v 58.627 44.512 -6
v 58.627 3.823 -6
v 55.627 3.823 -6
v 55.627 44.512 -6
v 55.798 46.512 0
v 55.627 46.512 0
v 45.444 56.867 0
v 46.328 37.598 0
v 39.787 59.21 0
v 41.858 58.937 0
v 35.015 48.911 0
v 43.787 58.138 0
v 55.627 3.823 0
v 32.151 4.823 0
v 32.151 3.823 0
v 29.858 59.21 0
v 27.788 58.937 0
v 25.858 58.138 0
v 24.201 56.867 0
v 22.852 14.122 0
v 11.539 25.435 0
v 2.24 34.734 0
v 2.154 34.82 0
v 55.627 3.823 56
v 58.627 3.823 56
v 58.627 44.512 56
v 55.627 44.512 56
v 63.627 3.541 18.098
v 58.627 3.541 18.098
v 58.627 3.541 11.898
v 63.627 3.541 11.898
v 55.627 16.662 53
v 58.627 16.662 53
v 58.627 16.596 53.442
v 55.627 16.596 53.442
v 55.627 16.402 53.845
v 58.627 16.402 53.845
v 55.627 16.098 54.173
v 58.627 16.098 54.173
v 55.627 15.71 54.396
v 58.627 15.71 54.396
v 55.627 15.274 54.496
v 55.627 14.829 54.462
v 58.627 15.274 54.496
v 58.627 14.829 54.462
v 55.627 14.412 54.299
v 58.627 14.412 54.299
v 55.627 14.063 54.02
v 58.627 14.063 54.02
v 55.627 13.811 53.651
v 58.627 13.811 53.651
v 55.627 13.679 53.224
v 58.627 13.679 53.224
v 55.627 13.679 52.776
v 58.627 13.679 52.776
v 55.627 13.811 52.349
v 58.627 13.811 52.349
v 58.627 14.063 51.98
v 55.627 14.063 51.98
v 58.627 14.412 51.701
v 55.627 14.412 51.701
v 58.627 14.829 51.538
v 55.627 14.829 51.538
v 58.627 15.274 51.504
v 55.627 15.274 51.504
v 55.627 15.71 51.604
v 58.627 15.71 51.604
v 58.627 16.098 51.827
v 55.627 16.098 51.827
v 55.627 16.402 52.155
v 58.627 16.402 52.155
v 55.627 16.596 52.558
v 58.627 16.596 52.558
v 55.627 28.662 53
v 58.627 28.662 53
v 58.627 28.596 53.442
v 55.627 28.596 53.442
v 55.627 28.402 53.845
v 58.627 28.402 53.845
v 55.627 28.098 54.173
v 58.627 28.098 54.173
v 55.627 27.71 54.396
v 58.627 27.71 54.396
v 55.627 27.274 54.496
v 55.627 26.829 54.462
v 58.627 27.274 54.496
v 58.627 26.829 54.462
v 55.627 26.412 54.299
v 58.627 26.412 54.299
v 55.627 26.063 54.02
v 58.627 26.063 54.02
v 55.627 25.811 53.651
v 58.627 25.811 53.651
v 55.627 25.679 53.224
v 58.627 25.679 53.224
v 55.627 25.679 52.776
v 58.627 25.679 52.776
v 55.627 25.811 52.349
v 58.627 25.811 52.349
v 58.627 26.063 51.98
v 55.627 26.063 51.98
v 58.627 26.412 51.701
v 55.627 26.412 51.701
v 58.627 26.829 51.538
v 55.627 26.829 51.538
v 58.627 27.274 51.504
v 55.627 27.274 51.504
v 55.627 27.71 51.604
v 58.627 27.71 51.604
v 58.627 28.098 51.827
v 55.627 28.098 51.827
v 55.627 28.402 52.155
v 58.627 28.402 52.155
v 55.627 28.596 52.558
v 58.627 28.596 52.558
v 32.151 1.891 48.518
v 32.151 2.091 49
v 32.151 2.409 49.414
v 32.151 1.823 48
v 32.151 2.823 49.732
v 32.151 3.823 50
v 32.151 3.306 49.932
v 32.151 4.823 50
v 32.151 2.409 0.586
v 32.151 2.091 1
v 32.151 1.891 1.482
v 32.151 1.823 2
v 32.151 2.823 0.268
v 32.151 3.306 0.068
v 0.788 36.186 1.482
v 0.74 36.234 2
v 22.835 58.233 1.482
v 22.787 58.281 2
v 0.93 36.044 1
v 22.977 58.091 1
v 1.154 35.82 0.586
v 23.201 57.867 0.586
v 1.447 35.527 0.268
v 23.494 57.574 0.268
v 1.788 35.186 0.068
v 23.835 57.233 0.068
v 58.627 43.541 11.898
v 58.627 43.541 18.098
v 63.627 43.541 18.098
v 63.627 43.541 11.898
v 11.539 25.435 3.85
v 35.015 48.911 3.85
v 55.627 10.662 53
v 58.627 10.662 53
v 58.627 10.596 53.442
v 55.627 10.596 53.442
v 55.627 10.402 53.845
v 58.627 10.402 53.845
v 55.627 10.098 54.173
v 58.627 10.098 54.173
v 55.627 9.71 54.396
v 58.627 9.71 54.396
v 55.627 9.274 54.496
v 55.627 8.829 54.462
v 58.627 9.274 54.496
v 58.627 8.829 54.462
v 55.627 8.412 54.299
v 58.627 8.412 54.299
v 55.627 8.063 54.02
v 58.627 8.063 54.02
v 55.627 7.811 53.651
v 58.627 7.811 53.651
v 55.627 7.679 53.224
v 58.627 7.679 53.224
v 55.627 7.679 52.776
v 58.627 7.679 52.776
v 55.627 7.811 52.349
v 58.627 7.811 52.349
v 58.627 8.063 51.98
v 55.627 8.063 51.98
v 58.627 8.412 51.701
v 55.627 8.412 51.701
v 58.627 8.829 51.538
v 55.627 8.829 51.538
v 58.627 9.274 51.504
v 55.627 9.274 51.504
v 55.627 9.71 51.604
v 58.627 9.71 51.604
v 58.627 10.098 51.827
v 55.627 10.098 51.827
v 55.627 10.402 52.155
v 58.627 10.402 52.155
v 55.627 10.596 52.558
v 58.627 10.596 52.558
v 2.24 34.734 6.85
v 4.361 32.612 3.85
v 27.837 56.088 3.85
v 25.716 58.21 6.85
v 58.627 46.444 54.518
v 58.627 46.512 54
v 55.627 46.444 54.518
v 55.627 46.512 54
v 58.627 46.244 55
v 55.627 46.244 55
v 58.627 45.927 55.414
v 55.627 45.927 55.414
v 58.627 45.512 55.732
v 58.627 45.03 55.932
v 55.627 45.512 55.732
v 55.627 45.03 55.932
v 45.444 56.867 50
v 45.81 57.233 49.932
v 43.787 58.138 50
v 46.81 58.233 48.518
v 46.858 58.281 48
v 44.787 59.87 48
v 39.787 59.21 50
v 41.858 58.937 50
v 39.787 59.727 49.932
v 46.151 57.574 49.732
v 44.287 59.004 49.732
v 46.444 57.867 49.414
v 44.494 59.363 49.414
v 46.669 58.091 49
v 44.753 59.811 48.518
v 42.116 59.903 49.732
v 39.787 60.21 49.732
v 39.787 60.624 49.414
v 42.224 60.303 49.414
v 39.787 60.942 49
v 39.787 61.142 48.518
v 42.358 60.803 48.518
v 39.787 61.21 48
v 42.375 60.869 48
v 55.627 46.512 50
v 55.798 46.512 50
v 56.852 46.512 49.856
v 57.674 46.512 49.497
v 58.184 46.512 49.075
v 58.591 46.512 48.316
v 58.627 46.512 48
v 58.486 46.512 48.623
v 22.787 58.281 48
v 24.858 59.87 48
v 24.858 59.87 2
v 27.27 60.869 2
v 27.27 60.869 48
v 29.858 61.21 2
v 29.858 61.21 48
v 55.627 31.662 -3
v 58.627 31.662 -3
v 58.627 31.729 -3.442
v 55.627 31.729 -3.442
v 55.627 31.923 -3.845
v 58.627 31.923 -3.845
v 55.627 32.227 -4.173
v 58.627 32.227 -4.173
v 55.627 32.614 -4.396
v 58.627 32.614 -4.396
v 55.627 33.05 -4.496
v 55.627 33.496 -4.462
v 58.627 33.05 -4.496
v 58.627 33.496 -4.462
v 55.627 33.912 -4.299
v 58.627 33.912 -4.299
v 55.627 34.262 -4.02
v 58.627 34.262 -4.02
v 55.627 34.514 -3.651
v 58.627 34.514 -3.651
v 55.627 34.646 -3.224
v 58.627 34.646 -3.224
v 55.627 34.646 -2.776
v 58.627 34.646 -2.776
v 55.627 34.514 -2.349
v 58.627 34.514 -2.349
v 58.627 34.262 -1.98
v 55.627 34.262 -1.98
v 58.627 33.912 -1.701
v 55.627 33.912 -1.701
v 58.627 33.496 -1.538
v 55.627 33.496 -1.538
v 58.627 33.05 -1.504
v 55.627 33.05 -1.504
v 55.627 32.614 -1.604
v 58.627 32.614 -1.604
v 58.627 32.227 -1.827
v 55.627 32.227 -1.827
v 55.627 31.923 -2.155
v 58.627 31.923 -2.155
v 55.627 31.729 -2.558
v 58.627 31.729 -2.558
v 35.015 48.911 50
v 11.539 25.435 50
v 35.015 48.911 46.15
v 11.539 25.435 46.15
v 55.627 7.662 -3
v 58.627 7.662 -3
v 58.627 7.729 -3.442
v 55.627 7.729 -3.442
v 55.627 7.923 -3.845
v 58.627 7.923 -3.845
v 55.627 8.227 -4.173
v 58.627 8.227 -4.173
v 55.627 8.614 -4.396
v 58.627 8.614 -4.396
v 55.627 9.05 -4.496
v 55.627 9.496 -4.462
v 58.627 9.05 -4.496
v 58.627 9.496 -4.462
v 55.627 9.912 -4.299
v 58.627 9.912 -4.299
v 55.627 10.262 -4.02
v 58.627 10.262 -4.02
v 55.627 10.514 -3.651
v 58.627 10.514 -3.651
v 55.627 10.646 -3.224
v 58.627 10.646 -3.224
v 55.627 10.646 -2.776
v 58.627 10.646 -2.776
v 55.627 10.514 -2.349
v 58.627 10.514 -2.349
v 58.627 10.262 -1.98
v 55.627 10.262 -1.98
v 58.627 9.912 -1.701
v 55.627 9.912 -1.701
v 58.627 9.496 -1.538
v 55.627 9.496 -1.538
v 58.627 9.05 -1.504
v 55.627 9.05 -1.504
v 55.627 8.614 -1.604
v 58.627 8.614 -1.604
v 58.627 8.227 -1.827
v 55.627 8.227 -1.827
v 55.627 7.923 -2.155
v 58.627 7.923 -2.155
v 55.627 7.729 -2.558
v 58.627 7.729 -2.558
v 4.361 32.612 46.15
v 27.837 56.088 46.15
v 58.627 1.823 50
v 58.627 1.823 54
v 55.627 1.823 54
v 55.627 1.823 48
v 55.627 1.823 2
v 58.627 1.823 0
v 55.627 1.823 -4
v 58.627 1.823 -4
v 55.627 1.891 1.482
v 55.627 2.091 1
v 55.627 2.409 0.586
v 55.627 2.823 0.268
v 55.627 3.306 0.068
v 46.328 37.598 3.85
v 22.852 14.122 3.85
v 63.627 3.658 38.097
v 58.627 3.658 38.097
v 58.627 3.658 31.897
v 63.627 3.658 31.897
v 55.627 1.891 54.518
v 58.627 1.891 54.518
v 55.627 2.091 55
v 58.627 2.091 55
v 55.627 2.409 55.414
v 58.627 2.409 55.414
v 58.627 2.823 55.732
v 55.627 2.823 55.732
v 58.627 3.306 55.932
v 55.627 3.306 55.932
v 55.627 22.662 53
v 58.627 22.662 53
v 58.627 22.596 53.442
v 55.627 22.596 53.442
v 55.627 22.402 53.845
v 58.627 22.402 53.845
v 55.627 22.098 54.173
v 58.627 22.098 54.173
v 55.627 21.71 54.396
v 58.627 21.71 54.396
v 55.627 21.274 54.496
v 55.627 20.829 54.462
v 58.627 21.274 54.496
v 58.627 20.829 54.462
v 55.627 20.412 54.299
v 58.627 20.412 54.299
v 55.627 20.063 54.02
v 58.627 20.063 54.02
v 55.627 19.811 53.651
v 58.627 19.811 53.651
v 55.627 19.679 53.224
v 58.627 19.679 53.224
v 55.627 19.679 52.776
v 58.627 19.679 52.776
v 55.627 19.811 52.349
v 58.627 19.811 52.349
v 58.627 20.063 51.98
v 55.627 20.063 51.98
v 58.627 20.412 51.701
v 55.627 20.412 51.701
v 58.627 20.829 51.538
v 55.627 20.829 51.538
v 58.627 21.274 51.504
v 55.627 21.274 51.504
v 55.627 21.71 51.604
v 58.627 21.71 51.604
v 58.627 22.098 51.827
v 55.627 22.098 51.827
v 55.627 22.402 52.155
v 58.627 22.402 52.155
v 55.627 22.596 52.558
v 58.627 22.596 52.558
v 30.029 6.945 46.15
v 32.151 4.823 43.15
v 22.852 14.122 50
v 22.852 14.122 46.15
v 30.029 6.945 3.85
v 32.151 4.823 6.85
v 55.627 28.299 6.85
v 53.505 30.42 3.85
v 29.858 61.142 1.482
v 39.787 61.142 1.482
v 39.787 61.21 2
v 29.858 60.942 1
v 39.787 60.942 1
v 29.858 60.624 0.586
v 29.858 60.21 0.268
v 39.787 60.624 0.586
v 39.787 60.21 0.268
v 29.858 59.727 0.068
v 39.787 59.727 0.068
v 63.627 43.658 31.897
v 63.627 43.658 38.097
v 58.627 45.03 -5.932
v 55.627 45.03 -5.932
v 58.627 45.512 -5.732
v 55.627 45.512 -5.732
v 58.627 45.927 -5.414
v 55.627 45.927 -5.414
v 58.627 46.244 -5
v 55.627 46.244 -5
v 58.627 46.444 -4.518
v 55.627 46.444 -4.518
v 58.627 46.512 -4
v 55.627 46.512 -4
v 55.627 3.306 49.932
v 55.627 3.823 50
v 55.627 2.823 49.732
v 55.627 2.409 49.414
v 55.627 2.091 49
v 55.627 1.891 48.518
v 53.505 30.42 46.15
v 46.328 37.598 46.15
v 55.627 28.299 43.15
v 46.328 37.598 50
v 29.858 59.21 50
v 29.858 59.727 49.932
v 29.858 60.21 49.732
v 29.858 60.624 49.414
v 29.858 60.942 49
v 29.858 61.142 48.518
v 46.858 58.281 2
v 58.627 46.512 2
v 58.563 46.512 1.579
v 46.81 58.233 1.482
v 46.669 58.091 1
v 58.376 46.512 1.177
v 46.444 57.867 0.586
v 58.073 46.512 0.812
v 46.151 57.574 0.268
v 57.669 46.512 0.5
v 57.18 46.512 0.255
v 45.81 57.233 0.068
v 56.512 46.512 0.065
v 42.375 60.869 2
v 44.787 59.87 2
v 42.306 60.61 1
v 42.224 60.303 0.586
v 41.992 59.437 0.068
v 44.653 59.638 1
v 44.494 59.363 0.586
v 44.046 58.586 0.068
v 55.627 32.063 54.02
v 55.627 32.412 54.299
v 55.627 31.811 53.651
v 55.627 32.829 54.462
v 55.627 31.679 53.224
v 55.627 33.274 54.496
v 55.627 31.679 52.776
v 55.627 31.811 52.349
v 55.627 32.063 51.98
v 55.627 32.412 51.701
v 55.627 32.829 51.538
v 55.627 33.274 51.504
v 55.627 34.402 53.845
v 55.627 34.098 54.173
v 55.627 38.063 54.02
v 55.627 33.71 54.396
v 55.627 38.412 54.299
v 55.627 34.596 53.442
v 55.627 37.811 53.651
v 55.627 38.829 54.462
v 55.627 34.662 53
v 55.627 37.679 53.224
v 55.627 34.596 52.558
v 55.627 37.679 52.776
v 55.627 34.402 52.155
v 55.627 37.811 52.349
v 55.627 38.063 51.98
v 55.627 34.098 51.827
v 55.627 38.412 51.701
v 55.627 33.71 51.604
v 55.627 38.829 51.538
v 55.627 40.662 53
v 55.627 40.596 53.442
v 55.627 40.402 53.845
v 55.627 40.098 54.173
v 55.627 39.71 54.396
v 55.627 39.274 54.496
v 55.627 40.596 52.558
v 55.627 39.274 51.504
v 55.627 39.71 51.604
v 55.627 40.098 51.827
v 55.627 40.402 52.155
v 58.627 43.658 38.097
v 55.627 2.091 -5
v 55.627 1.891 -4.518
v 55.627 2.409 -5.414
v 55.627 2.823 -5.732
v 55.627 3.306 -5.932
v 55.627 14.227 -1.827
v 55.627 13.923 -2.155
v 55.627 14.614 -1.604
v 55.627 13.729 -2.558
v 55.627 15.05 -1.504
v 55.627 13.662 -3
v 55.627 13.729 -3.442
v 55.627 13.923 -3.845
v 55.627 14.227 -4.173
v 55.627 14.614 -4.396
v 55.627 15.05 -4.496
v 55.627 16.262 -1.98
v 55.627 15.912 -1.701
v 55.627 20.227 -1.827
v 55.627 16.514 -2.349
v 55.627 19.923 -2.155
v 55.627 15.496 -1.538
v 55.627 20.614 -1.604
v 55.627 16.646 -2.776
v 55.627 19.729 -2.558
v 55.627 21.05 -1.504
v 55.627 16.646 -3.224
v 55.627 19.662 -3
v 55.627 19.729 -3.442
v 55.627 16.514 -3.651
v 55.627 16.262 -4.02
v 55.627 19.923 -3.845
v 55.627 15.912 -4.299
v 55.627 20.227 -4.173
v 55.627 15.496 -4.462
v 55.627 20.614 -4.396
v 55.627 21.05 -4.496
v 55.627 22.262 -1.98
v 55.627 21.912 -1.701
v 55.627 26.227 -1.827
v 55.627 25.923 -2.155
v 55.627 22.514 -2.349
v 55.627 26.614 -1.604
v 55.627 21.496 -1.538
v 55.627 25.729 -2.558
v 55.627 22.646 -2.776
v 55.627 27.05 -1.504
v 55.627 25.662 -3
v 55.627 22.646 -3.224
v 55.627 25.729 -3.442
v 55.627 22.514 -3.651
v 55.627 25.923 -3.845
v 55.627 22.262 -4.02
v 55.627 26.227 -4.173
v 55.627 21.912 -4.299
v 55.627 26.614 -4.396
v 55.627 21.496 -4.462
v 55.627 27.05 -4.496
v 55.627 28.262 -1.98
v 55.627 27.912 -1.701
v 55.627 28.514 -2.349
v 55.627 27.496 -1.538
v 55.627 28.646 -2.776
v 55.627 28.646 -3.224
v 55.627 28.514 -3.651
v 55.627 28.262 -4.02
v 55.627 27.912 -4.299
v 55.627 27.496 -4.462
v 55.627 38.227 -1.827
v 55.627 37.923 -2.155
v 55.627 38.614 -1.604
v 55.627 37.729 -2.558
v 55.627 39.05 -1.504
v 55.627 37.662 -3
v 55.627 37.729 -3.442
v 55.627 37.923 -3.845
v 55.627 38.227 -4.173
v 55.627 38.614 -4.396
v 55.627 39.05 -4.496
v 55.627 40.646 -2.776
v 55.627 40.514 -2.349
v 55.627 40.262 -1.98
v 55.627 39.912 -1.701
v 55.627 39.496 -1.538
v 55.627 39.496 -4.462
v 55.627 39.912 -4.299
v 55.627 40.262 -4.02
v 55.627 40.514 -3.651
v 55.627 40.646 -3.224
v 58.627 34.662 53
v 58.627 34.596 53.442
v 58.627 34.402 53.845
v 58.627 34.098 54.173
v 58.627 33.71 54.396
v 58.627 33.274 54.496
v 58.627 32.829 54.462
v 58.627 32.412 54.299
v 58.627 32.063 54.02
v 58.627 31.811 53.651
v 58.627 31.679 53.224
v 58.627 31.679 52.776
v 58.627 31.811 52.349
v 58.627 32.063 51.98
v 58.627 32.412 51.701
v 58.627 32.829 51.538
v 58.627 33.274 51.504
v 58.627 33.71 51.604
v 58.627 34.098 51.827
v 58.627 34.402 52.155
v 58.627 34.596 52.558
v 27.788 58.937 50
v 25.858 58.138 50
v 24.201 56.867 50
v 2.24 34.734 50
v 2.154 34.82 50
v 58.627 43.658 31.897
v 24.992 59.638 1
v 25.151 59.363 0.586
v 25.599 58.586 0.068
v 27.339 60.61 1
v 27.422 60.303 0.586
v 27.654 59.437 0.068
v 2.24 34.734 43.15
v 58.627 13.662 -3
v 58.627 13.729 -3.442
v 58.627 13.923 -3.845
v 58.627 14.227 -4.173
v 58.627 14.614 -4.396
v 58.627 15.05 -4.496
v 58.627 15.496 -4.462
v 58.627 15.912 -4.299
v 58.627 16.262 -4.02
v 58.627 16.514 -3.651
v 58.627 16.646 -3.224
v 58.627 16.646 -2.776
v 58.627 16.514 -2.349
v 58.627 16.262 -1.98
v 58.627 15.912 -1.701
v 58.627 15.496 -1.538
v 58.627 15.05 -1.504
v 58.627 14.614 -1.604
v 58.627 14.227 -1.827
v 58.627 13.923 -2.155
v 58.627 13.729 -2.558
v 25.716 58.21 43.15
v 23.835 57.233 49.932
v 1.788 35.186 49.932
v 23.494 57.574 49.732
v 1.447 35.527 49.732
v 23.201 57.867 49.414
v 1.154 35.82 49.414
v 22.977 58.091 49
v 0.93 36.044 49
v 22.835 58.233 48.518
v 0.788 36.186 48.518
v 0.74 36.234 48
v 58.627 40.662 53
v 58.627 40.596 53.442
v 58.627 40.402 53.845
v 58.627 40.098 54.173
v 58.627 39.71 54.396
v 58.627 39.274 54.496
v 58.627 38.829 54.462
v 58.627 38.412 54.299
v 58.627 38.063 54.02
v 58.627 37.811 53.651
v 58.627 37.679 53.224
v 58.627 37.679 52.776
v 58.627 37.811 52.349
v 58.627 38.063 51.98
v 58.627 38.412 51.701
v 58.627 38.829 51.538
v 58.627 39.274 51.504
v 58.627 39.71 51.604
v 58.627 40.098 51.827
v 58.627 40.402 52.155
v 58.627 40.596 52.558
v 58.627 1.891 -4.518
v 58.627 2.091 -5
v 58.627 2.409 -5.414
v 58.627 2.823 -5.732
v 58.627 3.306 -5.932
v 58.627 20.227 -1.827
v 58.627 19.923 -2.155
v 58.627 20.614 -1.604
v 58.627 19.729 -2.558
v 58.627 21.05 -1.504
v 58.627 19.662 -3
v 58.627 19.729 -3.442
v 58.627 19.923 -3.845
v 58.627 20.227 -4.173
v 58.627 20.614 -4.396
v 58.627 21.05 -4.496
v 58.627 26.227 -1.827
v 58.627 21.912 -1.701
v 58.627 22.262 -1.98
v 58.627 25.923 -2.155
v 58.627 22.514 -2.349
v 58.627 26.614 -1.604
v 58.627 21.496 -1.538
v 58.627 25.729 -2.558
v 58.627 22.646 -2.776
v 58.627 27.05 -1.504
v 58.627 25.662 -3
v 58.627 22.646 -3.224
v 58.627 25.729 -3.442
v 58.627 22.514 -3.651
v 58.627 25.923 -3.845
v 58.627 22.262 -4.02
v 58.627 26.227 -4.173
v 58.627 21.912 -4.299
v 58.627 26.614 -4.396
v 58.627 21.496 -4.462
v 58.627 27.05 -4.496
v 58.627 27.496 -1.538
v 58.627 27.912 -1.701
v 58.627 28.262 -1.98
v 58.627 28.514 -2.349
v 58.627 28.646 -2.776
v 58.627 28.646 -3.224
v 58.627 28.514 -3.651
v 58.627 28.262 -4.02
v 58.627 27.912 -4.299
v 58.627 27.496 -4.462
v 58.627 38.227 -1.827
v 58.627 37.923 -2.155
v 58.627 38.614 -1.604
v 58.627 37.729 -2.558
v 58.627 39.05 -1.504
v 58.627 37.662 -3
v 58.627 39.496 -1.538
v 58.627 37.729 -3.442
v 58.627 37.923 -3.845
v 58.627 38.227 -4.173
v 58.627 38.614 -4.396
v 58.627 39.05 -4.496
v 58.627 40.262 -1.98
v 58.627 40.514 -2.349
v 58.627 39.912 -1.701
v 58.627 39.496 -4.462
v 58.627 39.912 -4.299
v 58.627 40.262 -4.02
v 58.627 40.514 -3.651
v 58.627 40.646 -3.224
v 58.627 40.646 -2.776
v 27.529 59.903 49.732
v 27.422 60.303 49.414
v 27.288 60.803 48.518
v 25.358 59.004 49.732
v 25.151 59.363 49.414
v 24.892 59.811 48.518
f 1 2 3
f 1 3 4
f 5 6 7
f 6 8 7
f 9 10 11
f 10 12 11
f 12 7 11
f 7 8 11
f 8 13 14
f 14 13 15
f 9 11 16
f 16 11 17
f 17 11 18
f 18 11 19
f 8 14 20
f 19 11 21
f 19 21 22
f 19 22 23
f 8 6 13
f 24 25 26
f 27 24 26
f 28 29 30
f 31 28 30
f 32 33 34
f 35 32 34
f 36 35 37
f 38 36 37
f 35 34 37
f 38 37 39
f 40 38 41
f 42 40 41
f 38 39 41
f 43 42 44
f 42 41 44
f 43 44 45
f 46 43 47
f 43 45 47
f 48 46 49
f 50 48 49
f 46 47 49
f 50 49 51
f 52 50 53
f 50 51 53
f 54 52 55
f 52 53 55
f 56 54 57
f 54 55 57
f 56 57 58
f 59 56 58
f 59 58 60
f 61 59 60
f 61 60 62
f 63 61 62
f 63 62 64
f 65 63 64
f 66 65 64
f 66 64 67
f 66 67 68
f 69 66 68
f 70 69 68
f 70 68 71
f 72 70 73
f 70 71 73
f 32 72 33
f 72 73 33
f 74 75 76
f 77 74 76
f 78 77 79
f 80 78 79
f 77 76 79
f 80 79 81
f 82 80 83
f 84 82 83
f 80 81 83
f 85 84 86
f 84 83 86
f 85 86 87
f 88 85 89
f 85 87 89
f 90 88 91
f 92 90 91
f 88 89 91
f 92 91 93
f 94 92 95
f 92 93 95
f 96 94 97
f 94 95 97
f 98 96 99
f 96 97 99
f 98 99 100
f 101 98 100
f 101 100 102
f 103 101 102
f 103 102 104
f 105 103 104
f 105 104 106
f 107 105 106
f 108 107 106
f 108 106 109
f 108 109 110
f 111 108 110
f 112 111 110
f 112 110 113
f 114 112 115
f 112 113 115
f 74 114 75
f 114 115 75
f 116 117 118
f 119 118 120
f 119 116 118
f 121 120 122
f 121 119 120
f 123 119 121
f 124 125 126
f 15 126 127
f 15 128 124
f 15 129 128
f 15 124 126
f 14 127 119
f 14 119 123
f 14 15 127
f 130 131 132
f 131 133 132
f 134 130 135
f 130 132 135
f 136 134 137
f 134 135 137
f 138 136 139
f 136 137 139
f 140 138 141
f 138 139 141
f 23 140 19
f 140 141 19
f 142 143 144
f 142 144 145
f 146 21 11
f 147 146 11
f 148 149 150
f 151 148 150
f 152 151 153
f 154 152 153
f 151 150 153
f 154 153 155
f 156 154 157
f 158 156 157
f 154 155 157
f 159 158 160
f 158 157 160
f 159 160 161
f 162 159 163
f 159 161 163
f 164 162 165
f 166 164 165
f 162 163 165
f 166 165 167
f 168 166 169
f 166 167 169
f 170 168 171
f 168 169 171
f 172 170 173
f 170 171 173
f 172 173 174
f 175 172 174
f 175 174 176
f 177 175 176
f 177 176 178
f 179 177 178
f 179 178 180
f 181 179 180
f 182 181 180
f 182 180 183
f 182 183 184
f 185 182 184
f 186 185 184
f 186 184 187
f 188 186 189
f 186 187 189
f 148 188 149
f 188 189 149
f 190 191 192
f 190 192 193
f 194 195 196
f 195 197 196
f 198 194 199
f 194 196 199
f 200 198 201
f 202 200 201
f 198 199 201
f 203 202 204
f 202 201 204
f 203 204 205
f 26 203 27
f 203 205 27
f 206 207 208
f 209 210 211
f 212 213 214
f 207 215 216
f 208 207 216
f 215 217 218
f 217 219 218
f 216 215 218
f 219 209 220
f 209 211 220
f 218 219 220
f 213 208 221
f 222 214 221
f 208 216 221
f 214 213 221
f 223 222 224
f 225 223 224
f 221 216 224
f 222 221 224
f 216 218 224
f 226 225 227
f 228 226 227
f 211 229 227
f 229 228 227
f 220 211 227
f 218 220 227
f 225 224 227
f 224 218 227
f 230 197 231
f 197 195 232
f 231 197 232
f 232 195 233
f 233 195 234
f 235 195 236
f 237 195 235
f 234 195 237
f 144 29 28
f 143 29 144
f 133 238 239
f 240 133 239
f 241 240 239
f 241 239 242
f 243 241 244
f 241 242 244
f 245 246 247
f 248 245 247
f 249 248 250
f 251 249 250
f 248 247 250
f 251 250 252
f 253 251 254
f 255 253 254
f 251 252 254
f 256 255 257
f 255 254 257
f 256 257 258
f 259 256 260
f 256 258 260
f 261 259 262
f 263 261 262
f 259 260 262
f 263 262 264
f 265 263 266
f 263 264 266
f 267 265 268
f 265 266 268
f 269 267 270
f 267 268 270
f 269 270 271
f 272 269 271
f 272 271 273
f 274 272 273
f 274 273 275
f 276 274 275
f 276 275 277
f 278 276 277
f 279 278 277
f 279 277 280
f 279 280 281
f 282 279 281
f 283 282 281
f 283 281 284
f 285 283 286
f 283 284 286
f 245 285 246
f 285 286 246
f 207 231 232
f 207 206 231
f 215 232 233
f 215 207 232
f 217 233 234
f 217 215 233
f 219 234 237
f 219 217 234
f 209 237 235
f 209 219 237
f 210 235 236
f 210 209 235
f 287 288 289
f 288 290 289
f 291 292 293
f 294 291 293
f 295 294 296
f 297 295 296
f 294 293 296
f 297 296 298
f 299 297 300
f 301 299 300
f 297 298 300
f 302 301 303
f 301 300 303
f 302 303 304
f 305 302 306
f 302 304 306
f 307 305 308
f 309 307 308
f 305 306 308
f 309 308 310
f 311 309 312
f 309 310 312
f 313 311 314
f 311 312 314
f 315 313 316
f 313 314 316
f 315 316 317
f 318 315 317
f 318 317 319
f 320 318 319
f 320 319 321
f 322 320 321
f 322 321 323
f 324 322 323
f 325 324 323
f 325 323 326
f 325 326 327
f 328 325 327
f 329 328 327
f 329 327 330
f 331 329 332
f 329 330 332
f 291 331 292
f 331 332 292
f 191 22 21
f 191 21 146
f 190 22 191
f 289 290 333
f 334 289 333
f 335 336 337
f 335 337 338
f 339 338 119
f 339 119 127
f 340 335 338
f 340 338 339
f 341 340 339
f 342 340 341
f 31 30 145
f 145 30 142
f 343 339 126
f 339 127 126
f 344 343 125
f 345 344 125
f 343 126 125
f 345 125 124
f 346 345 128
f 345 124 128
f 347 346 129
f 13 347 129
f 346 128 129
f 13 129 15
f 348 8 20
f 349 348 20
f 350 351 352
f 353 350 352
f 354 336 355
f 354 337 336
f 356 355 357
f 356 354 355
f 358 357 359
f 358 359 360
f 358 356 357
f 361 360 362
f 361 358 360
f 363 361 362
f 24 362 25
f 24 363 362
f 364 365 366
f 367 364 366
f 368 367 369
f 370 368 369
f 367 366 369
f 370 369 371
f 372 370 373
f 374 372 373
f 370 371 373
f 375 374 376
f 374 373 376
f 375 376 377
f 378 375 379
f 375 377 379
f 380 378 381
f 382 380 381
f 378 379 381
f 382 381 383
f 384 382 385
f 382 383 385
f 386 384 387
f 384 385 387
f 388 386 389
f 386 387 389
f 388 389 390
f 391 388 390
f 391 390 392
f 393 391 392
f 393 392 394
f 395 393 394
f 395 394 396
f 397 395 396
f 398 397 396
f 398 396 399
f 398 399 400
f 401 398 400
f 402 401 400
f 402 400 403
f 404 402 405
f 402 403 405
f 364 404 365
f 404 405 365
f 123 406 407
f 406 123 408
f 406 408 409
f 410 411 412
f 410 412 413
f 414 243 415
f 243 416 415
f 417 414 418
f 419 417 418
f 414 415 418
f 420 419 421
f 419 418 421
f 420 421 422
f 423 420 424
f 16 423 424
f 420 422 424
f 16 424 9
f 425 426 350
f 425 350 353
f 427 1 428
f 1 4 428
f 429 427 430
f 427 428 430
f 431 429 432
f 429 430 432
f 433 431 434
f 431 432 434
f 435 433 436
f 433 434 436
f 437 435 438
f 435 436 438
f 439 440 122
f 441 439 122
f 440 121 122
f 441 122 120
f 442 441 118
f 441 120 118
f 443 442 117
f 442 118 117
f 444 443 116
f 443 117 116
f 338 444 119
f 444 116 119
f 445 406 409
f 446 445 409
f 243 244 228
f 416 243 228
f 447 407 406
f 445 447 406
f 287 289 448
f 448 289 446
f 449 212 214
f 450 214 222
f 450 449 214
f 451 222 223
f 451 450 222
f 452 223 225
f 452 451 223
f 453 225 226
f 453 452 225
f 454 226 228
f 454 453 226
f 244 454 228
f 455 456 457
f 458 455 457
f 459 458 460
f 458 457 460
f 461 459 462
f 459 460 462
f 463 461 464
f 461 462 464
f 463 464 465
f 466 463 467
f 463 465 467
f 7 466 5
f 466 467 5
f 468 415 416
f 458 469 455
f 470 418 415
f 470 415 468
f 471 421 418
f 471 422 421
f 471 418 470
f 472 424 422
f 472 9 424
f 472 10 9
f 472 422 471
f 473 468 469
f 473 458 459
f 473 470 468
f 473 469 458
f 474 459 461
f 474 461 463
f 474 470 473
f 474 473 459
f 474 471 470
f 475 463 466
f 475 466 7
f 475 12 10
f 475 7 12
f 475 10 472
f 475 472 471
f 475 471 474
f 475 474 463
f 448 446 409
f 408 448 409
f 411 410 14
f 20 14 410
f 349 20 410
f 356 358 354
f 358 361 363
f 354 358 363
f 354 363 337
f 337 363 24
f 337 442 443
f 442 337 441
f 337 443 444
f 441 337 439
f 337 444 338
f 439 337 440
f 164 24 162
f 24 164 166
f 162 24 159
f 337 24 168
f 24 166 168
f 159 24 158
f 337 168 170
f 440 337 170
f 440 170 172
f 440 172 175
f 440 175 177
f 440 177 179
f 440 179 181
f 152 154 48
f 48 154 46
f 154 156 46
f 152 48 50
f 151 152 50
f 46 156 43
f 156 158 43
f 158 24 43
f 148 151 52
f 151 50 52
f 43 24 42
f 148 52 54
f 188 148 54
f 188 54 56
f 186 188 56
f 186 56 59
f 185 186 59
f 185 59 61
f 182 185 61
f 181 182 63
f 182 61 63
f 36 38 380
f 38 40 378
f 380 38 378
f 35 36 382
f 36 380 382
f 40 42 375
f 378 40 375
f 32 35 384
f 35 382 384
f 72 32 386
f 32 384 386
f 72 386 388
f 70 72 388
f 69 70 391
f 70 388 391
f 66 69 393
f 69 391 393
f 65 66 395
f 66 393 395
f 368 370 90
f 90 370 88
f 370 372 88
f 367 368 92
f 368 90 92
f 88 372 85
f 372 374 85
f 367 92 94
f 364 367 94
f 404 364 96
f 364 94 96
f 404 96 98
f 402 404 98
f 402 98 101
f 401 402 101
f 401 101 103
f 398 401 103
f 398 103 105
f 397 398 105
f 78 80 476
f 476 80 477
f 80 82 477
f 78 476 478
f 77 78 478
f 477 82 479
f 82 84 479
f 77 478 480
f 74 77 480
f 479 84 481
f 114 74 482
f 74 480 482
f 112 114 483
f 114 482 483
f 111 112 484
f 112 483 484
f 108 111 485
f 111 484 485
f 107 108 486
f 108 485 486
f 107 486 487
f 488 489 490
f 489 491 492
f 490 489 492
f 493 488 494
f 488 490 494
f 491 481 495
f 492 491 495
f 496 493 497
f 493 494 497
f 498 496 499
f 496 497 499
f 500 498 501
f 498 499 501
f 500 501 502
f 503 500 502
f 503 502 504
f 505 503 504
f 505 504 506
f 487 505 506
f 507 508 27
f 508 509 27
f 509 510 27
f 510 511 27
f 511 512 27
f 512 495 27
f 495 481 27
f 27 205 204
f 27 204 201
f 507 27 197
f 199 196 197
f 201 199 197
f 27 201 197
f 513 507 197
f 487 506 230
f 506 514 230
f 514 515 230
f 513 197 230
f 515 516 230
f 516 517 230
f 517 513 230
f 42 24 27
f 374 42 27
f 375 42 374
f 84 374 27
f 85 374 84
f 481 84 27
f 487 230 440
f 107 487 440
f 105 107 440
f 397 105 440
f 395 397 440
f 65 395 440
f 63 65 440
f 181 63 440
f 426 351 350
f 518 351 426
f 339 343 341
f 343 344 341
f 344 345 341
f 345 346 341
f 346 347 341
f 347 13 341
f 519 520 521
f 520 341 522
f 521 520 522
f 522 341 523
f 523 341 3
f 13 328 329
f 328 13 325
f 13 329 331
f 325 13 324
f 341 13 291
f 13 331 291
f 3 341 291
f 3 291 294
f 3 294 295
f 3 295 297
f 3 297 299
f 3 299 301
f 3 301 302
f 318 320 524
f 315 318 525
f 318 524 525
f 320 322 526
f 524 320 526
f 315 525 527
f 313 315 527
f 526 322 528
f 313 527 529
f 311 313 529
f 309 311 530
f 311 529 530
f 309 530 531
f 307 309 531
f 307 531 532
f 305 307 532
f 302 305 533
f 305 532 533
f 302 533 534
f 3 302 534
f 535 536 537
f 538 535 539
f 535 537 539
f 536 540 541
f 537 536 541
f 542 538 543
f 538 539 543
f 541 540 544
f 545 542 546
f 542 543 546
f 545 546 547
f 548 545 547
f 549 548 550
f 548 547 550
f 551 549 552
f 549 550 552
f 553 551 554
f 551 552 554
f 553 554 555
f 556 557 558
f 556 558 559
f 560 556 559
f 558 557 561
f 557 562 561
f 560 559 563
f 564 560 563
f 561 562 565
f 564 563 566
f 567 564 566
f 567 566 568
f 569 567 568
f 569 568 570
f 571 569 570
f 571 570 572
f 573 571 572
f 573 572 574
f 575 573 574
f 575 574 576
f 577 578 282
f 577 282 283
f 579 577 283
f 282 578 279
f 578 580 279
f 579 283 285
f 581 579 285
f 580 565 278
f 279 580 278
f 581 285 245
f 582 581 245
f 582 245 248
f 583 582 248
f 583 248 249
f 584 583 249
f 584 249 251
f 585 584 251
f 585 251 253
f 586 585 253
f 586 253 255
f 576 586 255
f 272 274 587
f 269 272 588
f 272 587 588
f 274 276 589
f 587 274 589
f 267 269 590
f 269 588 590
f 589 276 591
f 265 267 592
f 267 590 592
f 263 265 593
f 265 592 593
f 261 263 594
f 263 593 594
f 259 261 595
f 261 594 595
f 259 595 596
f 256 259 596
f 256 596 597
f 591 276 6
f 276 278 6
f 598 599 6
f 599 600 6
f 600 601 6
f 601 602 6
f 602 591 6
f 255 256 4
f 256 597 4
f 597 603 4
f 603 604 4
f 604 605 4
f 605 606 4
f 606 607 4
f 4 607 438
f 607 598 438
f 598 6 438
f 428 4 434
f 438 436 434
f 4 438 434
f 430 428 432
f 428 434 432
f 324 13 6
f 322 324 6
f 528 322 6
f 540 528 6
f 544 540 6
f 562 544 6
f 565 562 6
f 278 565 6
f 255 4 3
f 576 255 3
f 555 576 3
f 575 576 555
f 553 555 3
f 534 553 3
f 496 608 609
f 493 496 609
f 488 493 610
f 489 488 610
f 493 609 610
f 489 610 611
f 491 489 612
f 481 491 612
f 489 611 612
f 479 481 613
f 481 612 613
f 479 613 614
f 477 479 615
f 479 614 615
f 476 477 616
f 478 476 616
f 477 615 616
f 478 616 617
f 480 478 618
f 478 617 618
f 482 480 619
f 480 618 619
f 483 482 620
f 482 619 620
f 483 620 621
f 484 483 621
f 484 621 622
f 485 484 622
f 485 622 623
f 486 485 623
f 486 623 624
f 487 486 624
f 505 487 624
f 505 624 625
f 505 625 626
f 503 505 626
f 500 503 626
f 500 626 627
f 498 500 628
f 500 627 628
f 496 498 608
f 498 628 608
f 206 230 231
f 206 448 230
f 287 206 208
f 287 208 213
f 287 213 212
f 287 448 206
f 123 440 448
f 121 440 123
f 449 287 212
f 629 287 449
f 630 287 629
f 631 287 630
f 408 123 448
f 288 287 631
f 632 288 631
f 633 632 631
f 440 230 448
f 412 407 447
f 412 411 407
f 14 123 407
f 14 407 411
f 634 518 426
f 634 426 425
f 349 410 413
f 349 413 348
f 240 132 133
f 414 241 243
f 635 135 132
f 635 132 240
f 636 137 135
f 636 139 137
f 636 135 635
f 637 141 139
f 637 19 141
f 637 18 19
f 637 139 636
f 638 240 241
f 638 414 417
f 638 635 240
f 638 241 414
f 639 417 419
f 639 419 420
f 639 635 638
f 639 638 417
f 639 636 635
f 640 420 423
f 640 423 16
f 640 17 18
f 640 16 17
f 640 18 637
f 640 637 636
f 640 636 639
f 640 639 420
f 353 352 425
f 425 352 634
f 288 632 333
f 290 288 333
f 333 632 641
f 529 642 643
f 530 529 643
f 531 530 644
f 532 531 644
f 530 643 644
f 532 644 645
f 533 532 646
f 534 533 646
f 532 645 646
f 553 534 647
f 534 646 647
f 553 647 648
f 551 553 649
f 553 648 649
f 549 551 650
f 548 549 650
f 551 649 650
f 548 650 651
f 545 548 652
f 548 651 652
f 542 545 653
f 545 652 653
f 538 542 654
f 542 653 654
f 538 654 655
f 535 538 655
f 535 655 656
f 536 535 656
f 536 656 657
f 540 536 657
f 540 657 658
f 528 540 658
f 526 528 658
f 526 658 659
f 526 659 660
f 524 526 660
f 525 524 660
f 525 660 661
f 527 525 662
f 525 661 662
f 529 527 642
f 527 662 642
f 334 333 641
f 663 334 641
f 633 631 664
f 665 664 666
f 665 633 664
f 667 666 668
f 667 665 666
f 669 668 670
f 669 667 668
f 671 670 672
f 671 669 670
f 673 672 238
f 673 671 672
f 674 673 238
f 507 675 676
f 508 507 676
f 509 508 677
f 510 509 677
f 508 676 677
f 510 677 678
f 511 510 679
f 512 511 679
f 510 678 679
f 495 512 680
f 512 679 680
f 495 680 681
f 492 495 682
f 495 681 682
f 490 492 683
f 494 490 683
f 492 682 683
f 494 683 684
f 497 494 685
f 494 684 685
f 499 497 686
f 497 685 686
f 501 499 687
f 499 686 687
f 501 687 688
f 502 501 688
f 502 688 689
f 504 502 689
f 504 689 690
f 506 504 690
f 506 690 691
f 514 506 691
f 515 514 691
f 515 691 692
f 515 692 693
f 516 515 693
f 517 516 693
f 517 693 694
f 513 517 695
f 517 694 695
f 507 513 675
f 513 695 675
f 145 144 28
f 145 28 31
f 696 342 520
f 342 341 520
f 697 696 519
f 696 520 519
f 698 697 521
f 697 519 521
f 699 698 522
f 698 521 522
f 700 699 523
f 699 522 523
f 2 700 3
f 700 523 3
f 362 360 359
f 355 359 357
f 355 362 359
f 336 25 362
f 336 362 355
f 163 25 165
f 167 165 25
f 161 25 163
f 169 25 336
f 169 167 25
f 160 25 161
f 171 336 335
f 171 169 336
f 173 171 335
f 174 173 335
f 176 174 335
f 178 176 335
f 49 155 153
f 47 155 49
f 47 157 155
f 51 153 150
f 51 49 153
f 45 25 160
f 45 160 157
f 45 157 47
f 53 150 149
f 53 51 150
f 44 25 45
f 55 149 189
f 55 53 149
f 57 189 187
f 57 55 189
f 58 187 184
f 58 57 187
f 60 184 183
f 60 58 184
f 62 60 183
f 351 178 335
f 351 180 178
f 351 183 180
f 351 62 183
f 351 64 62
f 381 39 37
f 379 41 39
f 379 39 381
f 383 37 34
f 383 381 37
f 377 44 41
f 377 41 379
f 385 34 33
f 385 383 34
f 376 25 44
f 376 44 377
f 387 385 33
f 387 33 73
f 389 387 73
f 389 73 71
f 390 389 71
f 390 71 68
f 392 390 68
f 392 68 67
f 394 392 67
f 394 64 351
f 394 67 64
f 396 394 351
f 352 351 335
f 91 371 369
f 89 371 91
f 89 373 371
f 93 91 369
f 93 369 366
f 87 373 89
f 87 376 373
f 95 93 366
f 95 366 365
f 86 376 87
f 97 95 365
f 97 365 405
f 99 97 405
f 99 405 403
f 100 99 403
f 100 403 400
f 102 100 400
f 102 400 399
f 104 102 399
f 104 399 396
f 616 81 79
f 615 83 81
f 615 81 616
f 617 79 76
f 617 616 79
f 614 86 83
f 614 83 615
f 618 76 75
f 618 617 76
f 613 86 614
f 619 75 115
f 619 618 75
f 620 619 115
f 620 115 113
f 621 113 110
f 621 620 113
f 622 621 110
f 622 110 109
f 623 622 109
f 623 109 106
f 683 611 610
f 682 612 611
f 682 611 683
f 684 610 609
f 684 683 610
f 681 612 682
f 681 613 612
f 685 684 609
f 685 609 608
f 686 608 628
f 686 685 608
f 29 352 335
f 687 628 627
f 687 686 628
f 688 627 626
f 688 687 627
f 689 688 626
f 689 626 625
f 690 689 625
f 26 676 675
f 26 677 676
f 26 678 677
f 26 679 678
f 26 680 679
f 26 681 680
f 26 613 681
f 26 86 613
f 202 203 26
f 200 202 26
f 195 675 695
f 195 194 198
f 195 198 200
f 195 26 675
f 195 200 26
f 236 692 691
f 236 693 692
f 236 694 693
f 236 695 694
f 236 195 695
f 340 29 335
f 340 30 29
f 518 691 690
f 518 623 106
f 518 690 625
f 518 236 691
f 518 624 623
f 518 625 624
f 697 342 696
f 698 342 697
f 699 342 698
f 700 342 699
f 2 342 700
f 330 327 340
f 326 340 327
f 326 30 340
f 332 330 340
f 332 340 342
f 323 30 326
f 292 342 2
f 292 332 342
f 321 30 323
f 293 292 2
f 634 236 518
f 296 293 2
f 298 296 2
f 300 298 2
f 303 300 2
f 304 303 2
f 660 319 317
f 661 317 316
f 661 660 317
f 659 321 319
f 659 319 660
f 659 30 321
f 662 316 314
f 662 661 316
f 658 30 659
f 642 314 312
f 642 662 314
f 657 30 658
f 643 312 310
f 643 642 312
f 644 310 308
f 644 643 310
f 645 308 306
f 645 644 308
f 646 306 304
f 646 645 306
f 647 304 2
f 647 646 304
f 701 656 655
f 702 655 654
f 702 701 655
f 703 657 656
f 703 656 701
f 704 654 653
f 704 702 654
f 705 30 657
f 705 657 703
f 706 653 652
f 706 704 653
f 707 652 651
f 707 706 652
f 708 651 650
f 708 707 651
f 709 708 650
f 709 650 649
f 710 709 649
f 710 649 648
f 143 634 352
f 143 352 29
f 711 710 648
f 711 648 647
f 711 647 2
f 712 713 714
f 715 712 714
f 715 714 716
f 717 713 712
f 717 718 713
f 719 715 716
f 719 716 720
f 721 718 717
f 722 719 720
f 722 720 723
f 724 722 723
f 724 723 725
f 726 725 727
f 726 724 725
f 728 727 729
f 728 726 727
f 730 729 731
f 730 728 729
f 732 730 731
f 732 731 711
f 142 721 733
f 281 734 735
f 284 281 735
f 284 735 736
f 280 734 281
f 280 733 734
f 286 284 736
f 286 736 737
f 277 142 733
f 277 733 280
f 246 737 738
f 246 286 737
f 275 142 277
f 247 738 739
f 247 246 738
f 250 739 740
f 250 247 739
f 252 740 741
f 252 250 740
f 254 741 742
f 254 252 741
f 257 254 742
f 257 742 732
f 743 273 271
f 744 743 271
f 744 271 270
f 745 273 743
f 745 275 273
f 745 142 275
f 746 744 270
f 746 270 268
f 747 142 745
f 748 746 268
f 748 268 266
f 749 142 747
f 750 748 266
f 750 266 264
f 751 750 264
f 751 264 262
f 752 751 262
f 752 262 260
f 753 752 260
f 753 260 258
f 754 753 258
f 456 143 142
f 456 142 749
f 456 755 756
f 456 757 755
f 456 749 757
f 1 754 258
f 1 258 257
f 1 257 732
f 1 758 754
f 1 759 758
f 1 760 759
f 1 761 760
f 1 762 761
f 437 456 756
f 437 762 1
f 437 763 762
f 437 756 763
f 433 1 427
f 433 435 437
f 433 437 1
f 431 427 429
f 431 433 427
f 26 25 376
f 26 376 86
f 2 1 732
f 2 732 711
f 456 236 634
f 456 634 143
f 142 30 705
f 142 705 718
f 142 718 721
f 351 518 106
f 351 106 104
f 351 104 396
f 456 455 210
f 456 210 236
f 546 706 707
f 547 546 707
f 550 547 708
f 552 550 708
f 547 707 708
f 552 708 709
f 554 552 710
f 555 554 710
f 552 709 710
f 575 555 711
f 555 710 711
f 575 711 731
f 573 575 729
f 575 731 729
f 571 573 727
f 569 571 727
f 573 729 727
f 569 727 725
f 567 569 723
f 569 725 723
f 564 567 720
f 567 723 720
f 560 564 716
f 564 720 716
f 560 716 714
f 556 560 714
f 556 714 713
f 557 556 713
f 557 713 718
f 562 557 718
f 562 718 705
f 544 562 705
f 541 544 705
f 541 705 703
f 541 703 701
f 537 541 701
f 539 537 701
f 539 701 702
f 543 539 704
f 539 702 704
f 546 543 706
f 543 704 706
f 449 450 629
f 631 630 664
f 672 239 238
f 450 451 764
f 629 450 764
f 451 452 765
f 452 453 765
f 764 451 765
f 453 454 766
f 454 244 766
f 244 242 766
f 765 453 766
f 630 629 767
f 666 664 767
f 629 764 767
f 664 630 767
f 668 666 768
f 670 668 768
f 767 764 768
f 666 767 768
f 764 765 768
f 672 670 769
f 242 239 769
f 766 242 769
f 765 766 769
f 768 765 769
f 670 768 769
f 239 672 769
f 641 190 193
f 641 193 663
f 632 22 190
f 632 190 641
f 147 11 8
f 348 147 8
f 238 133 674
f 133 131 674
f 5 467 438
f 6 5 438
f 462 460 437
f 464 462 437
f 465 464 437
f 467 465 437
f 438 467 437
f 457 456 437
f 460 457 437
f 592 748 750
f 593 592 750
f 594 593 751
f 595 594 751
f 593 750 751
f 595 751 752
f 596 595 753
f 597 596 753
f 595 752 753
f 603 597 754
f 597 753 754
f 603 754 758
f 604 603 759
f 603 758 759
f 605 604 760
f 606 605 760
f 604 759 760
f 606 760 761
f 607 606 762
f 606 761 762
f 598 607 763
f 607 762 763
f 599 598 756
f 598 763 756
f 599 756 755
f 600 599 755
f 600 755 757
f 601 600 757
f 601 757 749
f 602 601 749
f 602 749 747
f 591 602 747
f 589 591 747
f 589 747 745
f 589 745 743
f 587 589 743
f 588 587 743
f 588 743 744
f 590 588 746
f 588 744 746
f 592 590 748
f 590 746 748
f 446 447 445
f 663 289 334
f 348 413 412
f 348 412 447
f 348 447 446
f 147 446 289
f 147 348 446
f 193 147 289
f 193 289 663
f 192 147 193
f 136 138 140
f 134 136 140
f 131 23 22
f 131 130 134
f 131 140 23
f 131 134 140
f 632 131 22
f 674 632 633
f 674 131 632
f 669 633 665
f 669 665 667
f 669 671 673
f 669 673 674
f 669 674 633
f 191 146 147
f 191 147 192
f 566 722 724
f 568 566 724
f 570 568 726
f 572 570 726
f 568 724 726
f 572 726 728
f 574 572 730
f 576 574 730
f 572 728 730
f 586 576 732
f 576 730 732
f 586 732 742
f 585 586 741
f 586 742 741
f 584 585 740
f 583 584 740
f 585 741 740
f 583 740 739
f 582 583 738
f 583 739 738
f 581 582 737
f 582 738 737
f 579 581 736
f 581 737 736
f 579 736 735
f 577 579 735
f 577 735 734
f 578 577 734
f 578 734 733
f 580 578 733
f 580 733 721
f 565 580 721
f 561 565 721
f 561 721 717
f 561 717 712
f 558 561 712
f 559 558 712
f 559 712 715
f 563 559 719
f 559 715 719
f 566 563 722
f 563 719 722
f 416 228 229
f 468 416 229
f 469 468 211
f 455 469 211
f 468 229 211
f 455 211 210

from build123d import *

# Parameters (mm, degrees)
EXTRUDE_1_DEPTH     = 50
EXTRUDE_3_DEPTH     = 33.199998
EXTRUDE_4_REACH     = 79.048
SKETCH_4_W          = 50
SKETCH_4_H          = 2.121320344
CUT_EXTRUDE_1_DEPTH = 99.405896905
SKETCH_8_W          = 62
SKETCH_8_H          = 44.689148571
SKETCH_8_R          = 1.5
EXTRUDE_5_DEPTH     = 3
FILLET_1_R          = 10
FILLET_2_R          = 2
SKETCH_9_W          = 6.2
SKETCH_9_H          = 40
EXTRUDE_6_DEPTH     = 5
SKETCH_10_W         = 6.2
SKETCH_10_H         = 40
EXTRUDE_7_DEPTH     = 5


with BuildPart() as part:
    # 草图1 → 凸台-拉伸1 (new body)
    with BuildSketch(Plane.XY):
        Polygon((25.716046069, 61.209761814), (43.929249505, 61.209761814), (58.626662914, 46.512348406), (58.626662914, 1.823199835), (32.150717778, 1.823199835), (32.150717778, 4.823199835), (55.626662914, 28.29914497), (25.716046069, 58.209761814), align=None)
    extrude(amount=EXTRUDE_1_DEPTH)

    # 草图3 → 凸台-拉伸3 (add)
    with BuildSketch(Plane(origin=(41.962903942, 41.962903942, 0), x_dir=(0, 0, 1), z_dir=(-0.7071067811865476, -0.7071067811865476, 0))):
        Polygon((50, -19.323473251), (46.15, -19.323473251), (43.15, -19.323473251), (46.15, -16.323473251), (46.15, 19.976526749), (43.15, 22.976526749), (46.15, 22.976526749), (50, 22.976526749), align=None)
        Polygon((0, 22.976526749), (0, -19.323473251), (3.85, -19.323473251), (6.85, -19.323473251), (3.85, -16.323473251), (3.85, 19.976526749), (6.85, 22.976526749), (3.85, 22.976526749), align=None)
    extrude(amount=EXTRUDE_3_DEPTH)

    # 凸台-拉伸4: up to this plane
    extrude_4_end = Plane(origin=(25.716046069, 61.209761814, 50), z_dir=(0, -1, 0))
    # 草图4 → 凸台-拉伸4 (add, up to the surface)
    with BuildSketch(Plane(origin=(18.486958806, 18.486958806, 0), x_dir=(0, 0, 1), z_dir=(-0.7071067811865477, -0.7071067811865475, 0)), mode=Mode.PRIVATE) as extrude_4_sk1:
        with Locations((25, 24.037186921)):
            Rectangle(SKETCH_4_W, SKETCH_4_H)
    extrude_4_tool1 = split(extrude(extrude_4_sk1.sketch, amount=-EXTRUDE_4_REACH, mode=Mode.PRIVATE), bisect_by=extrude_4_end, keep=Keep.BOTH, mode=Mode.PRIVATE)
    add(extrude_4_tool1.solids().sort_by_distance((1.490101, 35.483817, 25))[0])

    # 草图5 → 切除-拉伸1 (cut, through all)
    with BuildSketch(Plane(origin=(0, 0, 0), x_dir=(-1, 0, 0), z_dir=(0, 0, -1))):
        Polygon((-35.014500242, 48.911307642), (-46.328208741, 37.597599143), (-22.852263606, 14.121654007), (-11.538555107, 25.435362506), align=None)
    extrude(amount=-CUT_EXTRUDE_1_DEPTH, mode=Mode.SUBTRACT)

    # 草图8 → 凸台-拉伸5 (add)
    with BuildSketch(Plane(origin=(58.626662914, 0, 0), x_dir=(0, 0, -1), z_dir=(1, 0, 0))):
        with Locations((-25, 24.16777412)):
            Rectangle(SKETCH_8_W, SKETCH_8_H)
        with Locations(Location((-53, 39.162348406, 0), (0, 0, 90))):
            Circle(SKETCH_8_R, mode=Mode.SUBTRACT)
        with Locations(Location((-53, 33.162348406, 0), (0, 0, 90))):
            Circle(SKETCH_8_R, mode=Mode.SUBTRACT)
        with Locations(Location((-53, 27.162348406, 0), (0, 0, 90))):
            Circle(SKETCH_8_R, mode=Mode.SUBTRACT)
        with Locations(Location((-53, 21.162348406, 0), (0, 0, 90))):
            Circle(SKETCH_8_R, mode=Mode.SUBTRACT)
        with Locations(Location((-53, 15.162348406, 0), (0, 0, 90))):
            Circle(SKETCH_8_R, mode=Mode.SUBTRACT)
        with Locations(Location((-53, 9.162348406, 0), (0, 0, 90))):
            Circle(SKETCH_8_R, mode=Mode.SUBTRACT)
        with Locations(Location((3, 9.162348406, 0), (0, 0, 270))):
            Circle(SKETCH_8_R, mode=Mode.SUBTRACT)
        with Locations(Location((3, 15.162348406, 0), (0, 0, 270))):
            Circle(SKETCH_8_R, mode=Mode.SUBTRACT)
        with Locations(Location((3, 21.162348406, 0), (0, 0, 270))):
            Circle(SKETCH_8_R, mode=Mode.SUBTRACT)
        with Locations(Location((3, 27.162348406, 0), (0, 0, 270))):
            Circle(SKETCH_8_R, mode=Mode.SUBTRACT)
        with Locations(Location((3, 33.162348406, 0), (0, 0, 270))):
            Circle(SKETCH_8_R, mode=Mode.SUBTRACT)
        with Locations(Location((3, 39.162348406, 0), (0, 0, 270))):
            Circle(SKETCH_8_R, mode=Mode.SUBTRACT)
    extrude(amount=-EXTRUDE_5_DEPTH)

    # 圆角1
    fillet_1_edges = [part.edges().sort_by_distance(p)[0] for p in [
        (25.716046069, 61.209761814, 25),
        (43.929249505, 61.209761814, 25),
    ]]
    fillet(fillet_1_edges, radius=FILLET_1_R)

    # 圆角2
    fillet_2_edges = [part.edges().sort_by_distance(p)[0] for p in [
        (52.742422303, 52.396589016, 0),
        (57.126662914, 1.823199835, -6),
        (57.126662914, 1.823199835, 56),
        (57.126662914, 46.512348406, 56),
        (57.126662914, 46.512348406, -6),
        (34.822647787, 61.209761814, 0),
        (34.822647787, 61.209761814, 50),
        (11.763607408, 47.257323152, 0),
        (26.031347369, 60.448557139, 0),
        (43.613948205, 60.448557139, 0),
        (11.763607408, 47.257323152, 50),
        (26.031347369, 60.448557139, 50),
        (43.613948205, 60.448557139, 50),
        (43.888690346, 1.823199835, 50),
        (43.888690346, 1.823199835, 0),
        (52.742422303, 52.396589016, 50),
    ]]
    fillet(fillet_2_edges, radius=FILLET_2_R)

    # 草图9 → 凸台-拉伸6 (add)
    with BuildSketch(Plane(origin=(58.626662914, 0, 0), x_dir=(0, 0, -1), z_dir=(1, 0, 0))):
        with Locations((-34.99740251, 23.658233783)):
            Rectangle(SKETCH_9_W, SKETCH_9_H)
    extrude(amount=EXTRUDE_6_DEPTH)

    # 草图10 → 凸台-拉伸7 (add)
    with BuildSketch(Plane(origin=(58.626662914, 0, 0), x_dir=(0, 0, -1), z_dir=(1, 0, 0))):
        with Locations((-14.997806006, 23.541157616)):
            Rectangle(SKETCH_10_W, SKETCH_10_H)
    extrude(amount=EXTRUDE_7_DEPTH)


solid = part.part
